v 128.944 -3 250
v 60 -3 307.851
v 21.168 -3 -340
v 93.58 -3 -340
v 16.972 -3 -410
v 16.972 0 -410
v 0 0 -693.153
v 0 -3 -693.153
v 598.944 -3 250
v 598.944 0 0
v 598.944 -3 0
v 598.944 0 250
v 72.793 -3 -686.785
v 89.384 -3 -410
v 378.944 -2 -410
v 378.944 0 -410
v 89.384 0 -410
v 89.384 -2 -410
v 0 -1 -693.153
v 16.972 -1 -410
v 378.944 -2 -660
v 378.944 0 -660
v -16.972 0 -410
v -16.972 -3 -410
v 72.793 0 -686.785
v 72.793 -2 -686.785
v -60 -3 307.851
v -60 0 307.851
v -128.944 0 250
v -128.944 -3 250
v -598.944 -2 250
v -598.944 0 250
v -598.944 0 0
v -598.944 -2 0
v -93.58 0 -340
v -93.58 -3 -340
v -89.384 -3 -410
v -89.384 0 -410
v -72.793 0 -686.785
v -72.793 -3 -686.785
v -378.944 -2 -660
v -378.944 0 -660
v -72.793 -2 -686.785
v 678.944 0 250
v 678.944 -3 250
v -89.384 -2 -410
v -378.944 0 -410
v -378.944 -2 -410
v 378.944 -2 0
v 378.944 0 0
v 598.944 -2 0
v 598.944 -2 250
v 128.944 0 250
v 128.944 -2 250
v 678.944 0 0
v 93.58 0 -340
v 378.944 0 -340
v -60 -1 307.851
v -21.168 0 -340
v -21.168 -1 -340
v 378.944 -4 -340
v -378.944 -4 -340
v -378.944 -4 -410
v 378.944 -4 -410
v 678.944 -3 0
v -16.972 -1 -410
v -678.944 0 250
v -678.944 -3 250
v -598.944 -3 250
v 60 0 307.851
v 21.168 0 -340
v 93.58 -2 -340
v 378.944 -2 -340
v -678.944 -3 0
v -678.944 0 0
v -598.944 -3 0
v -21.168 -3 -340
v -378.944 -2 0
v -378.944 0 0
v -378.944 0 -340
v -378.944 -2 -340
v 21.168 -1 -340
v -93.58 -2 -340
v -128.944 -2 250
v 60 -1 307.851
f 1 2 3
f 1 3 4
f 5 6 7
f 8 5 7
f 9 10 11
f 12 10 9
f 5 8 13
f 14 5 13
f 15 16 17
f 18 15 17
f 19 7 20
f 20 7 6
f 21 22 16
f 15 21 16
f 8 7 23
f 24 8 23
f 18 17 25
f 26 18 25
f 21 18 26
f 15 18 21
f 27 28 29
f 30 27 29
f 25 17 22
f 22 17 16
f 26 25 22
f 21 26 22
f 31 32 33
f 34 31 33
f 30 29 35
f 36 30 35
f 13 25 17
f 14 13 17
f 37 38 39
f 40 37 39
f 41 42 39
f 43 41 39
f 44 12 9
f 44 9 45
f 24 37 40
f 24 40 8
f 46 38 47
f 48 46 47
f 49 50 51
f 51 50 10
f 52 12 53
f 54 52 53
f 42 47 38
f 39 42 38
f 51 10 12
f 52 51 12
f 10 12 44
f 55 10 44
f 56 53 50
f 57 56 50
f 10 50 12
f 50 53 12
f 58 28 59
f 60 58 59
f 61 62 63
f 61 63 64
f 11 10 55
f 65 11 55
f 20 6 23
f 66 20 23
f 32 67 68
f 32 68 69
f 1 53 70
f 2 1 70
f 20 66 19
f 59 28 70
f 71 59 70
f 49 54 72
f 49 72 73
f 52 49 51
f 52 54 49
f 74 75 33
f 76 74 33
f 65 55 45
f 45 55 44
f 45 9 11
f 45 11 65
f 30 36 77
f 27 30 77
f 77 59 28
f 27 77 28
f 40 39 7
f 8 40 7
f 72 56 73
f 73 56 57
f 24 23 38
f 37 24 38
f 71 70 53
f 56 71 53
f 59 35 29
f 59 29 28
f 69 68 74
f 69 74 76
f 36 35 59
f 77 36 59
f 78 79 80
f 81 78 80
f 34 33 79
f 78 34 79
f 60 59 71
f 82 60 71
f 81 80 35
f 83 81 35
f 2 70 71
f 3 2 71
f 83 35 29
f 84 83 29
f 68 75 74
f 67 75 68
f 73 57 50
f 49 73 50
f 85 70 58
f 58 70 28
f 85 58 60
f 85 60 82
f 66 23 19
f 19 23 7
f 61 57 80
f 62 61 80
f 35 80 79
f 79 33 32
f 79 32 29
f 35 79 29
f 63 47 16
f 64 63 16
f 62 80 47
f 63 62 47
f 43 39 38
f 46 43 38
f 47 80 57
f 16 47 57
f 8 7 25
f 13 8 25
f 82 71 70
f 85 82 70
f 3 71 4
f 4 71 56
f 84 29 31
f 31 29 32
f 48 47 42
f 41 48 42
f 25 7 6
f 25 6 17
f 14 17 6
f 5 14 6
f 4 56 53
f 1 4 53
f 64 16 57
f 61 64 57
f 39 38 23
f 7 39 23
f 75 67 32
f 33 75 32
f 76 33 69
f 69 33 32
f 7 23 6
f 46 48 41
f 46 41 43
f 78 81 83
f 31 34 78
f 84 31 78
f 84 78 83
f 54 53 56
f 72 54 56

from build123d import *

# Parameters (mm, degrees)
F1_DEPTH = 1
F2_DEPTH = 2
F0_W     = 80
F0_H     = 250
F3_DEPTH = 3
F4_DEPTH = 4


with BuildPart() as f1:
    # F0 (on Front) → F1 (new body)
    with BuildSketch(Plane.XZ):
        Polygon((-60, 307.8508848718), (-21.1679416325, -340), (21.1679416325, -340), (60, 307.8508848718), (0, 307.8508848718), align=None)
    extrude(amount=F1_DEPTH)


with BuildPart() as f1b:
    # F0 (on Front) → F1, piece 2 (new body)
    with BuildSketch(Plane.XZ):
        Polygon((16.9721549952, -410), (-16.9721549952, -410), (0, -693.1533041007), align=None)
    extrude(amount=F1_DEPTH)


with BuildPart() as f2:
    # F0 (on Front) → F2 (new body)
    with BuildSketch(Plane.XZ):
        Polygon((128.9439998807, 250), (93.5795125089, -340), (378.9439998807, -340), (378.9439998807, 0), (598.9439998807, 0), (598.9439998807, 250), align=None)
    extrude(amount=F2_DEPTH)


with BuildPart() as f2b:
    # F0 (on Front) → F2, piece 2 (new body)
    with BuildSketch(Plane.XZ):
        Polygon((-598.9439998807, 0), (-378.9439998807, 0), (-378.9439998807, -340), (-93.5795125089, -340), (-128.9439998807, 250), (-598.9439998807, 250), align=None)
    extrude(amount=F2_DEPTH)


with BuildPart() as f2c:
    # F0 (on Front) → F2, piece 3 (new body)
    with BuildSketch(Plane.XZ):
        Polygon((-89.3837258716, -410), (-378.9439998807, -410), (-378.9439998807, -660), (-72.7933028723, -686.7847153188), align=None)
    extrude(amount=F2_DEPTH)


with BuildPart() as f2d:
    # F0 (on Front) → F2, piece 4 (new body)
    with BuildSketch(Plane.XZ):
        Polygon((89.3837258716, -410), (72.7933028723, -686.7847153188), (378.9439998807, -660), (378.9439998807, -410), align=None)
    extrude(amount=F2_DEPTH)


with BuildPart() as f3:
    # F0 (on Front) → F3 (new body)
    with BuildSketch(Plane.XZ):
        with Locations((638.9439998807, 125)):
            Rectangle(F0_W, F0_H)
    extrude(amount=F3_DEPTH)


with BuildPart() as f3b:
    # F0 (on Front) → F3, piece 2 (new body)
    with BuildSketch(Plane.XZ):
        Polygon((60, 307.8508848718), (21.1679416325, -340), (93.5795125089, -340), (128.9439998807, 250), align=None)
    extrude(amount=F3_DEPTH)


with BuildPart() as f3c:
    # F0 (on Front) → F3, piece 3 (new body)
    with BuildSketch(Plane.XZ):
        Polygon((-128.9439998807, 250), (-93.5795125089, -340), (-21.1679416325, -340), (-60, 307.8508848718), align=None)
    extrude(amount=F3_DEPTH)


with BuildPart() as f3d:
    # F0 (on Front) → F3, piece 4 (new body)
    with BuildSketch(Plane.XZ):
        with Locations((-638.9439998807, 125)):
            Rectangle(F0_W, F0_H)
    extrude(amount=F3_DEPTH)


with BuildPart() as f3e:
    # F0 (on Front) → F3, piece 5 (new body)
    with BuildSketch(Plane.XZ):
        Polygon((-16.9721549952, -410), (-89.3837258716, -410), (-72.7933028723, -686.7847153188), (0, -693.1533041007), align=None)
    extrude(amount=F3_DEPTH)


with BuildPart() as f3f:
    # F0 (on Front) → F3, piece 6 (new body)
    with BuildSketch(Plane.XZ):
        Polygon((16.9721549952, -410), (0, -693.1533041007), (72.7933028723, -686.7847153188), (89.3837258716, -410), align=None)
    extrude(amount=F3_DEPTH)


with BuildPart() as f4:
    # F0 (on Front) → F4 (new body)
    with BuildSketch(Plane.XZ):
        Polygon((-93.5795125089, -340), (-378.9439998807, -340), (-378.9439998807, -410), (-89.3837258716, -410), align=None)
        Polygon((-21.1679416325, -340), (-93.5795125089, -340), (-89.3837258716, -410), (-16.9721549952, -410), align=None)
        Polygon((93.5795125089, -340), (21.1679416325, -340), (16.9721549952, -410), (89.3837258716, -410), align=None)
        Polygon((378.9439998807, -340), (93.5795125089, -340), (89.3837258716, -410), (378.9439998807, -410), align=None)
        Polygon((21.1679416325, -340), (-21.1679416325, -340), (-16.9721549952, -410), (16.9721549952, -410), align=None)
    extrude(amount=F4_DEPTH)


solid = Compound([f1.part, f1b.part, f2.part, f2b.part, f2c.part, f2d.part, f3.part, f3b.part, f3c.part, f3d.part, f3e.part, f3f.part, f4.part])
